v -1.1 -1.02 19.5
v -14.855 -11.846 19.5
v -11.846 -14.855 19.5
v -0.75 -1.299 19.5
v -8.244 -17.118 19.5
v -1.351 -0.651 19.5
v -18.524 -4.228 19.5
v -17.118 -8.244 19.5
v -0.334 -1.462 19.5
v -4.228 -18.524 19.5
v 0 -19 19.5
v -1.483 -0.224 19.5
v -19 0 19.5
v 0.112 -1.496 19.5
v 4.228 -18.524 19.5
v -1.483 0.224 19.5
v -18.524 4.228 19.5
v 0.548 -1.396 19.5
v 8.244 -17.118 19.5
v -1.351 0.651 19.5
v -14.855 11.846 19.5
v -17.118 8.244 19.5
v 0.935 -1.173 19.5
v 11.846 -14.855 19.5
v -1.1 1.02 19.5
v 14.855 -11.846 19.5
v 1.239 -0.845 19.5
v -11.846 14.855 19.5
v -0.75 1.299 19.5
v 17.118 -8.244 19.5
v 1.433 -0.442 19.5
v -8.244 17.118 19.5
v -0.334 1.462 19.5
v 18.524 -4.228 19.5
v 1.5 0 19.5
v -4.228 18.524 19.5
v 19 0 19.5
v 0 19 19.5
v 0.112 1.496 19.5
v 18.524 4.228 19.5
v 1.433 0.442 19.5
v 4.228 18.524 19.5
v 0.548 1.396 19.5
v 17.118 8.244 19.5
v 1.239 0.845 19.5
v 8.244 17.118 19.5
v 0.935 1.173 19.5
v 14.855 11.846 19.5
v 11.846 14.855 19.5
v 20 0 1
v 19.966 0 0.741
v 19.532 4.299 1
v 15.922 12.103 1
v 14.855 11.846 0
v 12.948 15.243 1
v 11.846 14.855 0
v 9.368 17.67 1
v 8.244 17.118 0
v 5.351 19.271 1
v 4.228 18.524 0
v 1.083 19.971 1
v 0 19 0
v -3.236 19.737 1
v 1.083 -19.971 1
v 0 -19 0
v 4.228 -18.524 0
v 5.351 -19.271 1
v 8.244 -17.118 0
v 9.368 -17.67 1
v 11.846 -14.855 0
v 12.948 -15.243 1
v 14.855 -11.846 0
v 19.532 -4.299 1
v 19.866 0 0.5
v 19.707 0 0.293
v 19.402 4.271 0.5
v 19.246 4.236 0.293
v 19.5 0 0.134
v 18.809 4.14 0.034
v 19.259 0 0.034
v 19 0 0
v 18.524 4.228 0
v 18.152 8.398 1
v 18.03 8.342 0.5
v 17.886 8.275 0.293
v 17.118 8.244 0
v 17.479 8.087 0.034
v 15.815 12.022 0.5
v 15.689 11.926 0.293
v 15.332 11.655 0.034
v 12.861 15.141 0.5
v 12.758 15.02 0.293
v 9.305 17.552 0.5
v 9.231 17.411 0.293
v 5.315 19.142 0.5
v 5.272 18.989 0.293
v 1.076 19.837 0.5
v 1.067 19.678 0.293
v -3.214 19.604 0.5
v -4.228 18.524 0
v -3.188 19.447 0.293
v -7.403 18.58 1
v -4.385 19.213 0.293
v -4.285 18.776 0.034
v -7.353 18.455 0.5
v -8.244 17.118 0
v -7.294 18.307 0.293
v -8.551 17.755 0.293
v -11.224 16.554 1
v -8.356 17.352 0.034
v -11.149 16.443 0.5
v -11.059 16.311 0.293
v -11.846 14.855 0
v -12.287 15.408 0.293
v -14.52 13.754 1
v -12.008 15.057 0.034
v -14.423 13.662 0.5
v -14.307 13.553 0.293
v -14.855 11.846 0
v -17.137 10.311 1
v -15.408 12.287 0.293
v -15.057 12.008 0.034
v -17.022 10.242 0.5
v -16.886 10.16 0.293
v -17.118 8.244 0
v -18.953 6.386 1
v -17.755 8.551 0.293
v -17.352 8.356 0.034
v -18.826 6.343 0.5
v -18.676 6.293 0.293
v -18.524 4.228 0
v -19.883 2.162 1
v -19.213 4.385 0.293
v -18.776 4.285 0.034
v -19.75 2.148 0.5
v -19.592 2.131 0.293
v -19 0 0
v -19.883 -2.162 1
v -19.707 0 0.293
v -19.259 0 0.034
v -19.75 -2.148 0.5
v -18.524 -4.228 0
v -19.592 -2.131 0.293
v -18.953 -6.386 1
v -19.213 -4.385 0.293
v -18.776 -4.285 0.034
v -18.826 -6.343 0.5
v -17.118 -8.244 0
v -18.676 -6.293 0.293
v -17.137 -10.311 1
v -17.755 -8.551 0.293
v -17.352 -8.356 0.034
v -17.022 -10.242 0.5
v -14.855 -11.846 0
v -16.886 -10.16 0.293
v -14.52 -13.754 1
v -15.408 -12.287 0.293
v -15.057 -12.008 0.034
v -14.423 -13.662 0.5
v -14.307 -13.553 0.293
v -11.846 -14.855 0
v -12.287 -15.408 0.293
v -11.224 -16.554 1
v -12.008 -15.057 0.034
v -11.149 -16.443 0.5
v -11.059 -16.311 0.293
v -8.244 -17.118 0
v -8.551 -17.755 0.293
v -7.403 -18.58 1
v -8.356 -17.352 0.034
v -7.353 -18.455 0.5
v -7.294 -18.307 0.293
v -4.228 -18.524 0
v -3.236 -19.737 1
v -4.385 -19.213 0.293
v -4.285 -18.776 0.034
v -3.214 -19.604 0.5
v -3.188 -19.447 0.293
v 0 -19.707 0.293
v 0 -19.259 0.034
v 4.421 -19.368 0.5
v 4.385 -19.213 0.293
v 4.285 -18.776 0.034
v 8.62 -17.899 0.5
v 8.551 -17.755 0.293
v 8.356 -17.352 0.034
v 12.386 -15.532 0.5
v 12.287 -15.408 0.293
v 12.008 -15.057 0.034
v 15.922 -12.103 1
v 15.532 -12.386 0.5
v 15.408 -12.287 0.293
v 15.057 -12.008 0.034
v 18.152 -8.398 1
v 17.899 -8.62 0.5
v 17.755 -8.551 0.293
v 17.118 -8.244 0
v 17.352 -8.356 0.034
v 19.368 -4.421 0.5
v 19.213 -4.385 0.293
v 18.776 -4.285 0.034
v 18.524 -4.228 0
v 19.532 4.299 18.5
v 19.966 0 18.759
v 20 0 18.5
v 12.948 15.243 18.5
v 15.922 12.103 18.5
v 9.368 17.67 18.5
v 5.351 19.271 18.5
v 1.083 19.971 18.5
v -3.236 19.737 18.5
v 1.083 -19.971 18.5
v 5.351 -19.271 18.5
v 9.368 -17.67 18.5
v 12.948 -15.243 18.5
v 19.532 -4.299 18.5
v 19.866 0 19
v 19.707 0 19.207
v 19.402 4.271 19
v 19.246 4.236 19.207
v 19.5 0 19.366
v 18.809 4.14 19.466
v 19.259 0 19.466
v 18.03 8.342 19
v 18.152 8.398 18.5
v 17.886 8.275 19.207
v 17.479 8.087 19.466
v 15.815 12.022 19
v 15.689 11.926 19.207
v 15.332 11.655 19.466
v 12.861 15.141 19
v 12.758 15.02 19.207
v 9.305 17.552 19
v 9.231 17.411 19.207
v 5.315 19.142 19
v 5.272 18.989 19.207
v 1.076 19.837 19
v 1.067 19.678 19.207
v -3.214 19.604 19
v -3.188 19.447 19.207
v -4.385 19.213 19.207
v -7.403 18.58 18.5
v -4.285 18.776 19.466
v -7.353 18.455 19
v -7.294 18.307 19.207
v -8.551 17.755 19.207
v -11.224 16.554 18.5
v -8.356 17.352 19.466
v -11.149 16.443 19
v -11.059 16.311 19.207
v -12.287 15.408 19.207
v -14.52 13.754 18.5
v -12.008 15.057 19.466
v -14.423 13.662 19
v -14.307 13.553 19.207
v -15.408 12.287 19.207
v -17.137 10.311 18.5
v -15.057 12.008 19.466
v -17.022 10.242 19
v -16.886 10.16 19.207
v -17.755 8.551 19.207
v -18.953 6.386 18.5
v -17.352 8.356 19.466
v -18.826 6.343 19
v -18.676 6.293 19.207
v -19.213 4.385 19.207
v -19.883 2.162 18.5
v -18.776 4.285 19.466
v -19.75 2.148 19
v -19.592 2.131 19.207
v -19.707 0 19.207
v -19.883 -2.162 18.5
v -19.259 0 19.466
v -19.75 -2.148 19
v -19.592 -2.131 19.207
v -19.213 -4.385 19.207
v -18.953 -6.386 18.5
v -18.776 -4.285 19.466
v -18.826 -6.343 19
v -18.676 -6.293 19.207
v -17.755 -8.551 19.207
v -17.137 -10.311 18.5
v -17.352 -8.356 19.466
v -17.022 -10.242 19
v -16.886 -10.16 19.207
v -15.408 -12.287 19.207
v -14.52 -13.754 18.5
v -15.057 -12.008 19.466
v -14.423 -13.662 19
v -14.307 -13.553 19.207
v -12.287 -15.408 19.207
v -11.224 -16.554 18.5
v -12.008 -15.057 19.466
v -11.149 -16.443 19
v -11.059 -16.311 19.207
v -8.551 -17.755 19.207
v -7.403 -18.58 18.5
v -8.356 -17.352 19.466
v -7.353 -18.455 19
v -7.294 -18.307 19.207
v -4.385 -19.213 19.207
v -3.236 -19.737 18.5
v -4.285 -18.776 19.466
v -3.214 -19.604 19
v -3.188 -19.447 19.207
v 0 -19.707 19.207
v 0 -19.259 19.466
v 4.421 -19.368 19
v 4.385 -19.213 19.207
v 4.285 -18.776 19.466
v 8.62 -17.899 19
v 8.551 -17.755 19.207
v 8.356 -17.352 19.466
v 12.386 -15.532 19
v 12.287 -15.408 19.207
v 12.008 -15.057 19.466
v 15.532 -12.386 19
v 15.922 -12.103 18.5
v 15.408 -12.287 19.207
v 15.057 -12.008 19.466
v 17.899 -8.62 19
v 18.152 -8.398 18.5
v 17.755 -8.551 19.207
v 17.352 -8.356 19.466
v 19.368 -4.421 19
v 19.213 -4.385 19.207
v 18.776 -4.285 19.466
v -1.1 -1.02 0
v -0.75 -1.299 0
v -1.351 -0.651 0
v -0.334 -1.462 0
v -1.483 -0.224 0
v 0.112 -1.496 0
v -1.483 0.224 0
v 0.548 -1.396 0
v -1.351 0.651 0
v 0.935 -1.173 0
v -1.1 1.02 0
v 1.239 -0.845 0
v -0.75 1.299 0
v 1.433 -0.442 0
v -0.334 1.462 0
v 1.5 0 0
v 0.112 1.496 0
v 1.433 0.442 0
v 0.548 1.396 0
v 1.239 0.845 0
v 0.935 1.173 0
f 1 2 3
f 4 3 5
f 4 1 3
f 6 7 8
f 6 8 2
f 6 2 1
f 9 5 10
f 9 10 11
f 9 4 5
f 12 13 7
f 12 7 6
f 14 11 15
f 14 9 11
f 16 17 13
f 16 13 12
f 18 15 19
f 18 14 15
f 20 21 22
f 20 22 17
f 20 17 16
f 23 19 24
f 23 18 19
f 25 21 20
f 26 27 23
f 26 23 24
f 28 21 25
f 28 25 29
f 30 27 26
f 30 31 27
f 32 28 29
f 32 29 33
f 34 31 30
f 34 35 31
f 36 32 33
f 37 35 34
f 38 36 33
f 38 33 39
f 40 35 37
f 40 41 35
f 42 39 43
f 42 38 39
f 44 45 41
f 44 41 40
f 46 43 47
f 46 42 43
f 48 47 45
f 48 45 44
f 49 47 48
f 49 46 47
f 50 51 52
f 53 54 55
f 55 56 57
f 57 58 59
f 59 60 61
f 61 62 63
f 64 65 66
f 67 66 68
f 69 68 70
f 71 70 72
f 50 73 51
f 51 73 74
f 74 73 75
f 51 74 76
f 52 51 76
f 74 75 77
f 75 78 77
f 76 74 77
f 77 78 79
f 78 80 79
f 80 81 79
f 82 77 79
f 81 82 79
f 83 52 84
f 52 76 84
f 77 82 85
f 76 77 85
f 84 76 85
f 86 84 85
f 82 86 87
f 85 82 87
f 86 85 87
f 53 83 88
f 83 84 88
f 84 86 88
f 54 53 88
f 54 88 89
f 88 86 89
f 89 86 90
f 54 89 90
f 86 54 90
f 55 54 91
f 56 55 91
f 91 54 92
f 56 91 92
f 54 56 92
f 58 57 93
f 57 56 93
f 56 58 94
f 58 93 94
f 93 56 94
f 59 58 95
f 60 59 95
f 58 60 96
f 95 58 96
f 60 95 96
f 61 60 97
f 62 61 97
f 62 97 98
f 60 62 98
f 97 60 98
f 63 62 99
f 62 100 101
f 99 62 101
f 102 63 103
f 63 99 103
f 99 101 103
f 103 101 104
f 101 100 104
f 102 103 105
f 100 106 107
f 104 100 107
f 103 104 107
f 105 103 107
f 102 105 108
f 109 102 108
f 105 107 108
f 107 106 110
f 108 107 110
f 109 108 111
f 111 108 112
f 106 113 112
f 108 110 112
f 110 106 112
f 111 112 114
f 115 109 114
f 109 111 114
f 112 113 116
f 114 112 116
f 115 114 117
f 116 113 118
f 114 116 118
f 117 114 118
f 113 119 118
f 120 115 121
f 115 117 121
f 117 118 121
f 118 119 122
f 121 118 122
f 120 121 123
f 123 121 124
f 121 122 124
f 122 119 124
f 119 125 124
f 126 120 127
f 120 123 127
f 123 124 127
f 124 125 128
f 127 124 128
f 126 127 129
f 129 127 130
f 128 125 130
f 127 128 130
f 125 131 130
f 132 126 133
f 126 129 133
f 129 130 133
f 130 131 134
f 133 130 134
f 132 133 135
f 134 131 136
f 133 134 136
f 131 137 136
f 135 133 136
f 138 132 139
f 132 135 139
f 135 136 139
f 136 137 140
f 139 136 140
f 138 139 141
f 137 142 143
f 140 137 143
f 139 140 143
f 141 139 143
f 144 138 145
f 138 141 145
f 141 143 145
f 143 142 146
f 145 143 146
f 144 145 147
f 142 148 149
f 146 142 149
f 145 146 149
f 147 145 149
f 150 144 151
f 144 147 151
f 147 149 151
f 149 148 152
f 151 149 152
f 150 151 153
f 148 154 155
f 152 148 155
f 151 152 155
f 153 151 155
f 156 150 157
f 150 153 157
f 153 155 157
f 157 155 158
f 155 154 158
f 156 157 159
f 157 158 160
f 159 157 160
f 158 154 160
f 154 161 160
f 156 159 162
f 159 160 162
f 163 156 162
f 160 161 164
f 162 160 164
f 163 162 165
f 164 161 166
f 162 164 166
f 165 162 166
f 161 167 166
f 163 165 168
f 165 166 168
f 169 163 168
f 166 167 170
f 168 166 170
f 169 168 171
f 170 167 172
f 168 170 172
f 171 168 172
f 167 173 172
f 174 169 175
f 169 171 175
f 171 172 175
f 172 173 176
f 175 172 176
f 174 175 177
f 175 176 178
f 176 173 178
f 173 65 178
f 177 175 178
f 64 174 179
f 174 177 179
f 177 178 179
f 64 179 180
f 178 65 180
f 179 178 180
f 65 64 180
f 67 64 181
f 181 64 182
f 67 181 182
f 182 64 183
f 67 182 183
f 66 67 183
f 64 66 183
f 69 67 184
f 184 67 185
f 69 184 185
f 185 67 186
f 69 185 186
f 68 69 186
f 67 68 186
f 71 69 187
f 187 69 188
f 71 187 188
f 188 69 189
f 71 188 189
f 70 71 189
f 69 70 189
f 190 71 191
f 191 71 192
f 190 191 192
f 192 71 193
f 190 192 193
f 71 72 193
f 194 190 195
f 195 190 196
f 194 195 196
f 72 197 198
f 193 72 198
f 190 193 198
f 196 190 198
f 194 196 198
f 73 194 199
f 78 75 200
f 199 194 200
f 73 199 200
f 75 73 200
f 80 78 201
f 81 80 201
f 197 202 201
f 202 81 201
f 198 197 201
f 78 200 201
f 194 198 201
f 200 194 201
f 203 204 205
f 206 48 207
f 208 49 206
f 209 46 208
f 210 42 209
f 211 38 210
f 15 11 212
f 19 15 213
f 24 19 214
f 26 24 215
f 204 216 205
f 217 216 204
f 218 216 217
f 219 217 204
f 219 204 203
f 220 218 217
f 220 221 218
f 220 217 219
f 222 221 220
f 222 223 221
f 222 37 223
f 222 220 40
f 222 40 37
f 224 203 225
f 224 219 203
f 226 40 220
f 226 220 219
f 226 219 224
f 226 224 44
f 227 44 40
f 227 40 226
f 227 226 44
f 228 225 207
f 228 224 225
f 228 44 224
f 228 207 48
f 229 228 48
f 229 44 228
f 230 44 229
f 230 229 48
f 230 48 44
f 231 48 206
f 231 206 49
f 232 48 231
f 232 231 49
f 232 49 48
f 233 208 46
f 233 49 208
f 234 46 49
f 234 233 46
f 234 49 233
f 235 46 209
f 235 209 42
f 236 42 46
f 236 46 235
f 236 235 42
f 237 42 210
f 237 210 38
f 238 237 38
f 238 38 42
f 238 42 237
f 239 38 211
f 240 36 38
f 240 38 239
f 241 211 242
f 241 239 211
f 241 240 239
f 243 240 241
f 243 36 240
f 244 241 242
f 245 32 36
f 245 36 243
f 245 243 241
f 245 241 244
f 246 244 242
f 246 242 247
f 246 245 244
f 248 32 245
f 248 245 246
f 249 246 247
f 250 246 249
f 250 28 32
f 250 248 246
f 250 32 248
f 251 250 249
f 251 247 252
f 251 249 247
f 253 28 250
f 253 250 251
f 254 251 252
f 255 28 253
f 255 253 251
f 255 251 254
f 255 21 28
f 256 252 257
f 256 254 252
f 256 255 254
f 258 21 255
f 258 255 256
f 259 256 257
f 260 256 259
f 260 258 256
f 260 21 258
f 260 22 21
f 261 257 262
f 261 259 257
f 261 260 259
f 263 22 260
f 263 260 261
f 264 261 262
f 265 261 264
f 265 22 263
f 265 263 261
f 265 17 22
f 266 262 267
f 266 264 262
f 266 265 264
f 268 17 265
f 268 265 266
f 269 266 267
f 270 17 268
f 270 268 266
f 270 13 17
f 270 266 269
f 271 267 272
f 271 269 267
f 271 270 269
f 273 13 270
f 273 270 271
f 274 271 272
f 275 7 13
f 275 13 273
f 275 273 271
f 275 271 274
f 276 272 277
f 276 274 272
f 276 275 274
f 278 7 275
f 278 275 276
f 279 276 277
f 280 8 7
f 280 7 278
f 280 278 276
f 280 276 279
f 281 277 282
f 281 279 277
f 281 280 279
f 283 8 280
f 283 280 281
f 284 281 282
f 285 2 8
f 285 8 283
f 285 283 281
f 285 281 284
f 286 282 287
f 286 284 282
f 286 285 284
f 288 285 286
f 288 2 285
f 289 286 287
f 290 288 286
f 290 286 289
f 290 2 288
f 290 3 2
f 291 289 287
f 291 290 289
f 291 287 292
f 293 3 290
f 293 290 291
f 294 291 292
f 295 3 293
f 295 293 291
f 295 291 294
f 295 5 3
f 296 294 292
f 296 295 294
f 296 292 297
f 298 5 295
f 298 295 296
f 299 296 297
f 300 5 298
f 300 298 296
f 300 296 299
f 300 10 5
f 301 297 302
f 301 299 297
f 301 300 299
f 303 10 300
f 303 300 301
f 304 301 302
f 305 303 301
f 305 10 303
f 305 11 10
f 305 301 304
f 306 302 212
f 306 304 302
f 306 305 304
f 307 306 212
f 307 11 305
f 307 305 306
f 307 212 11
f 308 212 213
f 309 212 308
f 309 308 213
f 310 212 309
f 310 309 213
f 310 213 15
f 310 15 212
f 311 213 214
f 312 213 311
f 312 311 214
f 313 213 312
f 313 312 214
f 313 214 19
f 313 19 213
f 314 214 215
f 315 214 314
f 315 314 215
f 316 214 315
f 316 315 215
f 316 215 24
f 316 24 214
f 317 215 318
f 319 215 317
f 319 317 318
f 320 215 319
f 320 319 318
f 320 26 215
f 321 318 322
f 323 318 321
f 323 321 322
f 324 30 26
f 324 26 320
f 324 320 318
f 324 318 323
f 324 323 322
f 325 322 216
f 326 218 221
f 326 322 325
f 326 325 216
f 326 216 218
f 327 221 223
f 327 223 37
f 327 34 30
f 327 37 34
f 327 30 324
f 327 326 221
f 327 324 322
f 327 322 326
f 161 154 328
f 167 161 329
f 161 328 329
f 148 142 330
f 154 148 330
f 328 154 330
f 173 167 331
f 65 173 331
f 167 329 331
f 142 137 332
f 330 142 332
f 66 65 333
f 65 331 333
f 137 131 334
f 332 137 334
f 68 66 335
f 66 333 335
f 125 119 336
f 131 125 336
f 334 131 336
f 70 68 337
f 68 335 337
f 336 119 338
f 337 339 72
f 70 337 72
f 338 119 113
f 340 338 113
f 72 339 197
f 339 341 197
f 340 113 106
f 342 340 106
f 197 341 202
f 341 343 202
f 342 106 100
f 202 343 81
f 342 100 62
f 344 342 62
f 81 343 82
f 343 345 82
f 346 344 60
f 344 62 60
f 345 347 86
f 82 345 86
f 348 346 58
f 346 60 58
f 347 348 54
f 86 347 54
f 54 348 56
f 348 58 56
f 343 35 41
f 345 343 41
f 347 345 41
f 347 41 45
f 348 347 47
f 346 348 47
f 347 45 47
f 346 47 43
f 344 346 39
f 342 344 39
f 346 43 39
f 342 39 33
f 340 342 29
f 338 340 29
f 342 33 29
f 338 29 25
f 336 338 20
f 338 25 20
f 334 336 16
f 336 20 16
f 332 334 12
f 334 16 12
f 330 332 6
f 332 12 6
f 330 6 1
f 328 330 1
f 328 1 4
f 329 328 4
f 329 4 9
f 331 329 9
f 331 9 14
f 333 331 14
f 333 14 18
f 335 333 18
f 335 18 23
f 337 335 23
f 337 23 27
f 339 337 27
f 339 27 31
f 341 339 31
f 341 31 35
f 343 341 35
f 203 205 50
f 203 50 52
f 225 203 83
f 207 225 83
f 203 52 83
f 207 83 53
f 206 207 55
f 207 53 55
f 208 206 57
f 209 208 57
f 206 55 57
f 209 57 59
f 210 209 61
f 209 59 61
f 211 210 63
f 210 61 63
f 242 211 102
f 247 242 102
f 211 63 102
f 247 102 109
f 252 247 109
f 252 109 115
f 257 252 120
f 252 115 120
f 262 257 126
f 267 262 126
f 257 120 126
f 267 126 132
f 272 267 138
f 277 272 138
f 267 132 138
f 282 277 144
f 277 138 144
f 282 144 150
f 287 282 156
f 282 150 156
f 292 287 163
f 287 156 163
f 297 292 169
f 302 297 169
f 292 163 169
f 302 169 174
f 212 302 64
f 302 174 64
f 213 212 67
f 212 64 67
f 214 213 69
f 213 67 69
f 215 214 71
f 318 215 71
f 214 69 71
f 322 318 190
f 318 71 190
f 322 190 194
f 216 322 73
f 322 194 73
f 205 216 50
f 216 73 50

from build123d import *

# Parameters (mm, degrees)
SKETCH_1_R          = 20
EXTRUDE_1_DEPTH     = 19.5
FILLET_1_R          = 1
SKETCH_2_R          = 1.5
CUT_EXTRUDE_1_DEPTH = 20


with BuildPart() as part:
    # 草图1 → 凸台-拉伸1 (new body)
    with BuildSketch(Plane.XY):
        Circle(SKETCH_1_R)
    extrude(amount=EXTRUDE_1_DEPTH)

    # 圆角1
    fillet_1_edges = [part.edges().sort_by_distance(p)[0] for p in [
        (-20, 0, 0),
        (-20, 0, 19.5),
    ]]
    fillet(fillet_1_edges, radius=FILLET_1_R)

    # 草图2 → 切除-拉伸1 (cut)
    with BuildSketch(Plane.XY.offset(19.5)):
        Circle(SKETCH_2_R)
    extrude(amount=-CUT_EXTRUDE_1_DEPTH, mode=Mode.SUBTRACT)


solid = part.part
